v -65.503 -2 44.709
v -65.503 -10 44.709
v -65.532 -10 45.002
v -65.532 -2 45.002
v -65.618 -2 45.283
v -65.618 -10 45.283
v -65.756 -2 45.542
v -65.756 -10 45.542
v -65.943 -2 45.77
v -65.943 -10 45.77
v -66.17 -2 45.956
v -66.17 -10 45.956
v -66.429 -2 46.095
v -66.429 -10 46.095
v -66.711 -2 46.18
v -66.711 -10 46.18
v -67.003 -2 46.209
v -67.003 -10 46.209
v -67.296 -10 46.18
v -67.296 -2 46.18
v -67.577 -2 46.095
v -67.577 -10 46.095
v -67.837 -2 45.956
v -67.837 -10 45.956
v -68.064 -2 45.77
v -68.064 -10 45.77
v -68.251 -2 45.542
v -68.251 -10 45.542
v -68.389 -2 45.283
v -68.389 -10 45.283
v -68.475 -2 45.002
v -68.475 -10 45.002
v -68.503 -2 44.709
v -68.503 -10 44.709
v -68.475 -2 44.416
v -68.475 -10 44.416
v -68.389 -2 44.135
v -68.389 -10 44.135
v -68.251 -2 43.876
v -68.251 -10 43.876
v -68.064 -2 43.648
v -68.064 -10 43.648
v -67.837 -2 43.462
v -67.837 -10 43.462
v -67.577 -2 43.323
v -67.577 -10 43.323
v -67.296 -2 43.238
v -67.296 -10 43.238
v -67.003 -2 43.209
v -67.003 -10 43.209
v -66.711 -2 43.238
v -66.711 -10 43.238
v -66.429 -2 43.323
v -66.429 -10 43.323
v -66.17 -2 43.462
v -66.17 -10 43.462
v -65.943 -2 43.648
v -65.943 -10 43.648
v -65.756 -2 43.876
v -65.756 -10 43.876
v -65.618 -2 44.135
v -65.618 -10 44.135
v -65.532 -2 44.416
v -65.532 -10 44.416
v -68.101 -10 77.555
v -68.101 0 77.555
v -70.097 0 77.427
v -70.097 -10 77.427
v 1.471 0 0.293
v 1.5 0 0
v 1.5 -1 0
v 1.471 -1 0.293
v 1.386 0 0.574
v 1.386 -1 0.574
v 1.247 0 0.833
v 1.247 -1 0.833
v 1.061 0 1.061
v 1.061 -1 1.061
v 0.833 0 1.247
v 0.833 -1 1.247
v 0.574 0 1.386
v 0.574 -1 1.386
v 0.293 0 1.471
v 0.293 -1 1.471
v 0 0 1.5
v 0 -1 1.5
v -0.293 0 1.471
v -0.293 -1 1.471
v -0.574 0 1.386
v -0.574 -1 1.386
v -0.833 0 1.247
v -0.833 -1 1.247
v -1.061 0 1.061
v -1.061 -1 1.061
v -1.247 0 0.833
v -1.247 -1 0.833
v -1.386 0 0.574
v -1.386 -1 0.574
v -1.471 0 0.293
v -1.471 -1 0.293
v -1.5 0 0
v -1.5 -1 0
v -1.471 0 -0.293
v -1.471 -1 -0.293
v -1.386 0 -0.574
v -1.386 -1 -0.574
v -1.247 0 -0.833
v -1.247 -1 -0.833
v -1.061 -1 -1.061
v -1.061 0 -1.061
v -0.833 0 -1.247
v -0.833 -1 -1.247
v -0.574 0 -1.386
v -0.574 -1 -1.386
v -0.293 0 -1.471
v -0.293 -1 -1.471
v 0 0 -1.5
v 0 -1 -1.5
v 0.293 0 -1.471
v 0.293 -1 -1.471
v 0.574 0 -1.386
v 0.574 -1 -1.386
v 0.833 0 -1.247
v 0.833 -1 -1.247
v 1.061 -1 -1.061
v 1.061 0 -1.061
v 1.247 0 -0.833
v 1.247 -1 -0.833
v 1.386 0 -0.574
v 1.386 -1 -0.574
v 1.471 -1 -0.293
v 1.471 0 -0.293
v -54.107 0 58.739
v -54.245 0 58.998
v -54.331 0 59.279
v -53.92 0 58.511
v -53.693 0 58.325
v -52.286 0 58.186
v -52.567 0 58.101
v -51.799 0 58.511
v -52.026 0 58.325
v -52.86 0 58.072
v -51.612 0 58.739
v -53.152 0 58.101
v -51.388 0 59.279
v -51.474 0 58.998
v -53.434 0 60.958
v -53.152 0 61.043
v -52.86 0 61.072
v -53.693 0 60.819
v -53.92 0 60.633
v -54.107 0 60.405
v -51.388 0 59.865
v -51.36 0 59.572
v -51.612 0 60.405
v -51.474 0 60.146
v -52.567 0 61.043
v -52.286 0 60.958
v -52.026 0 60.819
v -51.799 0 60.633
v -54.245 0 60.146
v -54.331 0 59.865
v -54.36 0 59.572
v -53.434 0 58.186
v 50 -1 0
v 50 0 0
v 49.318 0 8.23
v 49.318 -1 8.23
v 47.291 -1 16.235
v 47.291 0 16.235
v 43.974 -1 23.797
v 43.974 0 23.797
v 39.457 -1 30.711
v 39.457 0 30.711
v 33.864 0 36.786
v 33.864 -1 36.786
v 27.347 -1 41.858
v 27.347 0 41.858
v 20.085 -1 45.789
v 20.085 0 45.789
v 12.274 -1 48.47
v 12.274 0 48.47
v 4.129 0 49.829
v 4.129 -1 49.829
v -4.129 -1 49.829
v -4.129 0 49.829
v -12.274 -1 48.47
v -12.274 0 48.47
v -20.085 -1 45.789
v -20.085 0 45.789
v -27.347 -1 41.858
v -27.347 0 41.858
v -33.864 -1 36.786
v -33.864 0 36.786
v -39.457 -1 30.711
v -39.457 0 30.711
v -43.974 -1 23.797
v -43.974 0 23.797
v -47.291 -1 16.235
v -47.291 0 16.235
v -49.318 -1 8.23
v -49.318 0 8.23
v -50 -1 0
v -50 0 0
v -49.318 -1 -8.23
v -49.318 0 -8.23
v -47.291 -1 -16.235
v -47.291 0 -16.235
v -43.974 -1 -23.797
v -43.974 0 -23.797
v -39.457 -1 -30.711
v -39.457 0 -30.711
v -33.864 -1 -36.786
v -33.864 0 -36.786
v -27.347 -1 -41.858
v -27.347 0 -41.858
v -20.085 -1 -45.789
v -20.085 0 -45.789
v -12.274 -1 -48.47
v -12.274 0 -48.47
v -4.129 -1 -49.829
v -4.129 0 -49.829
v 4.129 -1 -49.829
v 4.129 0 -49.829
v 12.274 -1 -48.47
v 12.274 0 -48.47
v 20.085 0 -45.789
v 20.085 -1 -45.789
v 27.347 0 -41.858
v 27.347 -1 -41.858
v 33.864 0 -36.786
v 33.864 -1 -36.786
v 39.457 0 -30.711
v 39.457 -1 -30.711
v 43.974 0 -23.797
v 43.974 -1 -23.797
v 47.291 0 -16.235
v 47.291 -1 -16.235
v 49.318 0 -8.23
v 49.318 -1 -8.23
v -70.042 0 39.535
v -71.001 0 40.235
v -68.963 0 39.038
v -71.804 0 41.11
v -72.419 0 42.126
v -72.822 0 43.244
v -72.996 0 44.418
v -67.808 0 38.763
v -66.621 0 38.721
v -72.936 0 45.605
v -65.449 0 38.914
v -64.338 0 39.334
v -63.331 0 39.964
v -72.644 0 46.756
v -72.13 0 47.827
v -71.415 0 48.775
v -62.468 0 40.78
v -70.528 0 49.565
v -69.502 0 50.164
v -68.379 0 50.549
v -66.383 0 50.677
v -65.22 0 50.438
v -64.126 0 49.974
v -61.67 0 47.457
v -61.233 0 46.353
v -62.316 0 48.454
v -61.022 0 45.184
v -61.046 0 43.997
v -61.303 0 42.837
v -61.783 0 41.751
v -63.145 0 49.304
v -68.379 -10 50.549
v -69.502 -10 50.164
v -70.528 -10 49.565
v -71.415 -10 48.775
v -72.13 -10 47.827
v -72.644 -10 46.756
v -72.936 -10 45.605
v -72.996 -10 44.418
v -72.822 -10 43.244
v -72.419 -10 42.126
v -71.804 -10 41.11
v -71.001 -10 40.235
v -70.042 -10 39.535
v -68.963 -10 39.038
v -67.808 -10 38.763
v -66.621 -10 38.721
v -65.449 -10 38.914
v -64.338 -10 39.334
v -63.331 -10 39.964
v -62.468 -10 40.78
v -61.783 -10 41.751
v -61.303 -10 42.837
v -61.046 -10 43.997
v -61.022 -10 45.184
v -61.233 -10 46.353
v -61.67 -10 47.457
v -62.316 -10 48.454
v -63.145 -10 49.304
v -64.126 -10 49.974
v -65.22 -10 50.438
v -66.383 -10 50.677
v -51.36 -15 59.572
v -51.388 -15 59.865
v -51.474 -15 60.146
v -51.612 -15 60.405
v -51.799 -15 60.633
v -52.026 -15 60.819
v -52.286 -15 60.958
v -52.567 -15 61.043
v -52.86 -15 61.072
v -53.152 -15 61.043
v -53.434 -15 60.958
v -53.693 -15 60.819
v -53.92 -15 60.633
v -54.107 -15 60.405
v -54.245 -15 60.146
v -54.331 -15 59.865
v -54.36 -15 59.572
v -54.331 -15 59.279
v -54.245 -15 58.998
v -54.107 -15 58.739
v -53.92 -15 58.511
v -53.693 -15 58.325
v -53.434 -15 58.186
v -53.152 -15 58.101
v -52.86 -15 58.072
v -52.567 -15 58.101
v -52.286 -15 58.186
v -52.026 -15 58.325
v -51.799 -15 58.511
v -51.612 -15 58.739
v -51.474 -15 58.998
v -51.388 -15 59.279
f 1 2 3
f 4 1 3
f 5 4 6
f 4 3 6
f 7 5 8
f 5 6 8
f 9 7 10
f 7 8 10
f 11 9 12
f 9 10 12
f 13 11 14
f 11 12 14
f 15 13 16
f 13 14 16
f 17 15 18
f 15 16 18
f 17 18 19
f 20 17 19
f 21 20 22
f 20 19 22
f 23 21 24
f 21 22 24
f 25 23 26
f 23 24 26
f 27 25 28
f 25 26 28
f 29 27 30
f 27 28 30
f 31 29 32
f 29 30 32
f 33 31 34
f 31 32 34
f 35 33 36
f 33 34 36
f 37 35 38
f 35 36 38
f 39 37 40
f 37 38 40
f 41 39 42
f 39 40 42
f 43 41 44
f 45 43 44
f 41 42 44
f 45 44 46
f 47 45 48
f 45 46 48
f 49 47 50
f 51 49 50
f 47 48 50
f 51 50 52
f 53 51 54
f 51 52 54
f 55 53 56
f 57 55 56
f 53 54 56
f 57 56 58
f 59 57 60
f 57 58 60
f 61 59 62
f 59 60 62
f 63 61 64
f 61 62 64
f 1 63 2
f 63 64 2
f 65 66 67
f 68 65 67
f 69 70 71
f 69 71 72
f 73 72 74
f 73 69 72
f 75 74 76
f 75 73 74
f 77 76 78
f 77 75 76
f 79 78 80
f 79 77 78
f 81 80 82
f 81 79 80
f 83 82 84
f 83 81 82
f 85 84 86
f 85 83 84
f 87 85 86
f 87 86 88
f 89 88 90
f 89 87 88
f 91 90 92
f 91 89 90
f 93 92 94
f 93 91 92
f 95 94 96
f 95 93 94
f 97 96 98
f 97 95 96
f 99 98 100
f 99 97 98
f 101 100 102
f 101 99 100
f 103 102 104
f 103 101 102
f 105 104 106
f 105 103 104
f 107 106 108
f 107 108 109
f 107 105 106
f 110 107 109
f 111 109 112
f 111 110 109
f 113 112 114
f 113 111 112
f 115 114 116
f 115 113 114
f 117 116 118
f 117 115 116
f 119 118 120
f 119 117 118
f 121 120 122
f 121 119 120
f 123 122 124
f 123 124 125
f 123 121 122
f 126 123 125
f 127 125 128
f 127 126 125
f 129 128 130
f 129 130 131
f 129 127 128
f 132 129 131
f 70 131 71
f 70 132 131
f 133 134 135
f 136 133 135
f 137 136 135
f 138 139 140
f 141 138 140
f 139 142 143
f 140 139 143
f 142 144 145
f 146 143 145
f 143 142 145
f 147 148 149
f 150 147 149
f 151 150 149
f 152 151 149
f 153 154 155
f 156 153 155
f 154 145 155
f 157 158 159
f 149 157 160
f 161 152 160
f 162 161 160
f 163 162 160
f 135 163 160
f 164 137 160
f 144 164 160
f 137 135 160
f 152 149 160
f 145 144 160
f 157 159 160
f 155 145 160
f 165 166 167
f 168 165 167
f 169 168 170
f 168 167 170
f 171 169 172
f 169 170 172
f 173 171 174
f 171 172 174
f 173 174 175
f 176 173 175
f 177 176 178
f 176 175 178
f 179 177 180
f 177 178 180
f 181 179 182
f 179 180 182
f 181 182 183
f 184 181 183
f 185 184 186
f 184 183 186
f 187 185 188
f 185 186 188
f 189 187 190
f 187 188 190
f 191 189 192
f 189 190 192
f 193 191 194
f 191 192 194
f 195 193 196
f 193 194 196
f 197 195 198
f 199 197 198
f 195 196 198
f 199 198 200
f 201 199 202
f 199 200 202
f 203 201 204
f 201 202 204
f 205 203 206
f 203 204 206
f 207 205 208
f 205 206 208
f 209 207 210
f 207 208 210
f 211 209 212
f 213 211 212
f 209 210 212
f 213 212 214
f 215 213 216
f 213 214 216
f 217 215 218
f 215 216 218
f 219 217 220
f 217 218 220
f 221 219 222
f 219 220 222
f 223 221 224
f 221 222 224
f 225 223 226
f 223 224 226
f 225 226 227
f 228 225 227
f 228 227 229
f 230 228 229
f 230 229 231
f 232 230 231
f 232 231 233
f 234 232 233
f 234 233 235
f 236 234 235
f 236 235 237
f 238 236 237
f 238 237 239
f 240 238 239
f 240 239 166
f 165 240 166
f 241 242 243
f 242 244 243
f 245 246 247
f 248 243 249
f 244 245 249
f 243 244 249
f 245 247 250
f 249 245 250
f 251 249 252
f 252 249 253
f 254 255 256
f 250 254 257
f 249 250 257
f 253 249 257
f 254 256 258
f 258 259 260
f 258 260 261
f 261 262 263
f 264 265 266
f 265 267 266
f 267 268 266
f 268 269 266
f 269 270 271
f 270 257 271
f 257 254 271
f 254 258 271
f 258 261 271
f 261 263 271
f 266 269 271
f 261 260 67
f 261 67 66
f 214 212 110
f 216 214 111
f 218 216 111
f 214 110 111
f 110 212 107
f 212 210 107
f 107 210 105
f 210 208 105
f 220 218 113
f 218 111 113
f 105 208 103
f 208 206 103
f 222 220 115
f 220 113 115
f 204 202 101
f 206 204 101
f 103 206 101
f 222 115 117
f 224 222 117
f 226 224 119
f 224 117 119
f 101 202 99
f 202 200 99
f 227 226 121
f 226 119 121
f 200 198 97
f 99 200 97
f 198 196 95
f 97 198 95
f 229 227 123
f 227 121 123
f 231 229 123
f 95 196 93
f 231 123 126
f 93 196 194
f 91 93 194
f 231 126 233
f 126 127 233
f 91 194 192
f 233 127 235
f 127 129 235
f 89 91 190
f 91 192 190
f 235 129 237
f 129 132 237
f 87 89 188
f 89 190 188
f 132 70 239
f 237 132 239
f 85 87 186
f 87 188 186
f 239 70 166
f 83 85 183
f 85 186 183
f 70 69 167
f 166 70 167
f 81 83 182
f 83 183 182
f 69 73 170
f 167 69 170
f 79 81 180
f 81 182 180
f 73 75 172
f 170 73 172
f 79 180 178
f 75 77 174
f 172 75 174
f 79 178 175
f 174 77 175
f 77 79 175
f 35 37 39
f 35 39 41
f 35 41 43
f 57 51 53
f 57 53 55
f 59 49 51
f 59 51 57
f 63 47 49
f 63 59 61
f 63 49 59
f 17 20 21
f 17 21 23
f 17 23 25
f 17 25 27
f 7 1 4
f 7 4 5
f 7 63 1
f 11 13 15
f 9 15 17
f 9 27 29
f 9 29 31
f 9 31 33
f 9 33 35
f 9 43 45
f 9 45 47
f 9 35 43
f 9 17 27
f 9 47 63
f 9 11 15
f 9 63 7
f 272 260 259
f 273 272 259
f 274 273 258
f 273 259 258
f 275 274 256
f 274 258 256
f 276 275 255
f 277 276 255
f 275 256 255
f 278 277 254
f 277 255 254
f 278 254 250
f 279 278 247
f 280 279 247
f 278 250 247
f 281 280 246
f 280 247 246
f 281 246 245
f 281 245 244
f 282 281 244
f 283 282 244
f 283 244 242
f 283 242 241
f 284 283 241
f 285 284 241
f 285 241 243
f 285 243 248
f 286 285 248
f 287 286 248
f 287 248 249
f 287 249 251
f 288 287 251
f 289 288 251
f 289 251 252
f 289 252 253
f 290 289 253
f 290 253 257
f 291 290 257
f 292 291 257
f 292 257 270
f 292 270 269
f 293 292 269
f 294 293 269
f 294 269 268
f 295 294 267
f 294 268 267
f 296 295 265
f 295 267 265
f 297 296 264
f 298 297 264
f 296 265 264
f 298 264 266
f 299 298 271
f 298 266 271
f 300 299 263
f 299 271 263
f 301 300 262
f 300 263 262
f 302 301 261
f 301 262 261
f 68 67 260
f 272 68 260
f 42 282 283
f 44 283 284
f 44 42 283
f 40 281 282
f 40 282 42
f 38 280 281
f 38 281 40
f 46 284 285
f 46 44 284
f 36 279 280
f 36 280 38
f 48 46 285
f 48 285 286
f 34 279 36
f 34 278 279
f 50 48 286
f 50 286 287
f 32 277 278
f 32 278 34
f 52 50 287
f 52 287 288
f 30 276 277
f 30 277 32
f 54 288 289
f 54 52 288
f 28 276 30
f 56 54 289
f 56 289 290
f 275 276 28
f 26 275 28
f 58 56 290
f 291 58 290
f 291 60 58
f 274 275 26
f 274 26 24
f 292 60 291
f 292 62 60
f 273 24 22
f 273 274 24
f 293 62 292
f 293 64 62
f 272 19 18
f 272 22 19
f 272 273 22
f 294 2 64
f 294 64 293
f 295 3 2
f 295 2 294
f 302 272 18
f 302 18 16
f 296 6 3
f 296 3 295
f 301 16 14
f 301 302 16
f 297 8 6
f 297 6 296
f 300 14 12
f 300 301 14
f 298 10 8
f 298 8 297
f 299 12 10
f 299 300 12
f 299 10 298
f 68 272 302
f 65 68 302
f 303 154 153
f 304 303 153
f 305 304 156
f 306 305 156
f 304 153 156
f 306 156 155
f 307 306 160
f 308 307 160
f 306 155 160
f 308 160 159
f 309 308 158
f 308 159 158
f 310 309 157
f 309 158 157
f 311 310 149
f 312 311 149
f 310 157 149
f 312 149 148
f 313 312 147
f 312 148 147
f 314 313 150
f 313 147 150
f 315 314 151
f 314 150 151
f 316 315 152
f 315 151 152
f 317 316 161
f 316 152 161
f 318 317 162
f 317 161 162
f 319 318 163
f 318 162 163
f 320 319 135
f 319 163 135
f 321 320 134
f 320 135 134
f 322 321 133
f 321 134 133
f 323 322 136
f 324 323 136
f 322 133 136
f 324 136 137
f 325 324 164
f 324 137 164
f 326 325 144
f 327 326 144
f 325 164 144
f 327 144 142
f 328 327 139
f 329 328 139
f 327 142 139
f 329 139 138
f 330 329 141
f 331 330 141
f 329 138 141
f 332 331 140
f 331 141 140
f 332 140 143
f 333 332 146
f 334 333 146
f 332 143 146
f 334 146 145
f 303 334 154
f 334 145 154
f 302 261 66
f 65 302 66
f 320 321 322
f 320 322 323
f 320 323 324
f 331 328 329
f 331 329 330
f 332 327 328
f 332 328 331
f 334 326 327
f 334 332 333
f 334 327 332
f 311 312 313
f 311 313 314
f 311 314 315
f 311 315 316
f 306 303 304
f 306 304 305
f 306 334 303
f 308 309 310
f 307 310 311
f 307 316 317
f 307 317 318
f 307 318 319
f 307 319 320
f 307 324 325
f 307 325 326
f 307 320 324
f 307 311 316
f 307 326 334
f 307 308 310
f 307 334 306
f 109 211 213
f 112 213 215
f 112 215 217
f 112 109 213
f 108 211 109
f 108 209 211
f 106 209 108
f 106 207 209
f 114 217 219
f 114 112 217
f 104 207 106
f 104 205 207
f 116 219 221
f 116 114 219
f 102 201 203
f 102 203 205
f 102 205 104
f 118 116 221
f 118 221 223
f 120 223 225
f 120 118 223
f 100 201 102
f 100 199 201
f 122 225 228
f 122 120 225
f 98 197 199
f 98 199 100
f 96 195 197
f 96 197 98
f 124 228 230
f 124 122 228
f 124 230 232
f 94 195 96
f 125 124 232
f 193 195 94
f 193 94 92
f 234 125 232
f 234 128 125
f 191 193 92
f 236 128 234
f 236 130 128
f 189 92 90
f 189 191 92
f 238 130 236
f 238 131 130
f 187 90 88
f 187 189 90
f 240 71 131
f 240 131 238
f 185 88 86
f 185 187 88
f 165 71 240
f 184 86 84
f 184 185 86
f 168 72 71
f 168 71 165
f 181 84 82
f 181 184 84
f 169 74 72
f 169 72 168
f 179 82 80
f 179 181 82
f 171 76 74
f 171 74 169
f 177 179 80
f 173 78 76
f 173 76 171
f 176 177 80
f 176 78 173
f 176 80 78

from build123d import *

# Parameters (mm, degrees)
F0_R          = 50
F1_DEPTH      = 1
F2_R          = 1.5
F3_DEPTH      = 25
F3_DEPTH_BACK = 1
F4_R          = 1.5
F5_DEPTH      = 15
F6_R          = 6
F8_DEPTH      = 10
F9_R          = 1.5
F10_DEPTH     = 8
F13_DEPTH     = 10


with BuildPart() as f1:
    # F0 (on Front) → F1 (new body)
    with BuildSketch(Plane.XZ):
        Circle(F0_R)
    extrude(amount=F1_DEPTH)

    # F2 (on Front) → F3 (cut, two sides)
    with BuildSketch(Plane.XZ) as f3_sk:
        Circle(F2_R)
    extrude(amount=-F3_DEPTH, mode=Mode.SUBTRACT)
    extrude(f3_sk.sketch, amount=F3_DEPTH_BACK, mode=Mode.SUBTRACT)


with BuildPart() as f5:
    # F4 (on Front) → F5 (new body)
    with BuildSketch(Plane.XZ):
        with Locations((-52.8595931828, 59.5719181001)):
            Circle(F4_R)
    extrude(amount=F5_DEPTH)


with BuildPart() as f8:
    # F6 (on Front) → F8 (new body)
    with BuildSketch(Plane.XZ):
        with Locations((-67.003428936, 44.7089038789)):
            Circle(F6_R)
    extrude(amount=F8_DEPTH)

    # F9 (on face) → F10 (cut, through all)
    with BuildSketch(Plane.XZ.offset(10)):
        with Locations((-67.003428936, 44.7089038789)):
            Circle(F9_R)
    extrude(amount=-F10_DEPTH, mode=Mode.SUBTRACT)

    # F12 (on Front) → F13 (join, through all)
    with BuildSketch(Plane.XZ):
        Polygon((-68.1013876257, 77.554673188), (-69.0993500163, 77.4908682742), (-70.0973124069, 77.4270633604), (-68.378866287, 50.5491240883), (-66.3829415059, 50.6767339158), align=None)
    extrude(amount=F13_DEPTH)


solid = Compound([f1.part, f5.part, f8.part])
